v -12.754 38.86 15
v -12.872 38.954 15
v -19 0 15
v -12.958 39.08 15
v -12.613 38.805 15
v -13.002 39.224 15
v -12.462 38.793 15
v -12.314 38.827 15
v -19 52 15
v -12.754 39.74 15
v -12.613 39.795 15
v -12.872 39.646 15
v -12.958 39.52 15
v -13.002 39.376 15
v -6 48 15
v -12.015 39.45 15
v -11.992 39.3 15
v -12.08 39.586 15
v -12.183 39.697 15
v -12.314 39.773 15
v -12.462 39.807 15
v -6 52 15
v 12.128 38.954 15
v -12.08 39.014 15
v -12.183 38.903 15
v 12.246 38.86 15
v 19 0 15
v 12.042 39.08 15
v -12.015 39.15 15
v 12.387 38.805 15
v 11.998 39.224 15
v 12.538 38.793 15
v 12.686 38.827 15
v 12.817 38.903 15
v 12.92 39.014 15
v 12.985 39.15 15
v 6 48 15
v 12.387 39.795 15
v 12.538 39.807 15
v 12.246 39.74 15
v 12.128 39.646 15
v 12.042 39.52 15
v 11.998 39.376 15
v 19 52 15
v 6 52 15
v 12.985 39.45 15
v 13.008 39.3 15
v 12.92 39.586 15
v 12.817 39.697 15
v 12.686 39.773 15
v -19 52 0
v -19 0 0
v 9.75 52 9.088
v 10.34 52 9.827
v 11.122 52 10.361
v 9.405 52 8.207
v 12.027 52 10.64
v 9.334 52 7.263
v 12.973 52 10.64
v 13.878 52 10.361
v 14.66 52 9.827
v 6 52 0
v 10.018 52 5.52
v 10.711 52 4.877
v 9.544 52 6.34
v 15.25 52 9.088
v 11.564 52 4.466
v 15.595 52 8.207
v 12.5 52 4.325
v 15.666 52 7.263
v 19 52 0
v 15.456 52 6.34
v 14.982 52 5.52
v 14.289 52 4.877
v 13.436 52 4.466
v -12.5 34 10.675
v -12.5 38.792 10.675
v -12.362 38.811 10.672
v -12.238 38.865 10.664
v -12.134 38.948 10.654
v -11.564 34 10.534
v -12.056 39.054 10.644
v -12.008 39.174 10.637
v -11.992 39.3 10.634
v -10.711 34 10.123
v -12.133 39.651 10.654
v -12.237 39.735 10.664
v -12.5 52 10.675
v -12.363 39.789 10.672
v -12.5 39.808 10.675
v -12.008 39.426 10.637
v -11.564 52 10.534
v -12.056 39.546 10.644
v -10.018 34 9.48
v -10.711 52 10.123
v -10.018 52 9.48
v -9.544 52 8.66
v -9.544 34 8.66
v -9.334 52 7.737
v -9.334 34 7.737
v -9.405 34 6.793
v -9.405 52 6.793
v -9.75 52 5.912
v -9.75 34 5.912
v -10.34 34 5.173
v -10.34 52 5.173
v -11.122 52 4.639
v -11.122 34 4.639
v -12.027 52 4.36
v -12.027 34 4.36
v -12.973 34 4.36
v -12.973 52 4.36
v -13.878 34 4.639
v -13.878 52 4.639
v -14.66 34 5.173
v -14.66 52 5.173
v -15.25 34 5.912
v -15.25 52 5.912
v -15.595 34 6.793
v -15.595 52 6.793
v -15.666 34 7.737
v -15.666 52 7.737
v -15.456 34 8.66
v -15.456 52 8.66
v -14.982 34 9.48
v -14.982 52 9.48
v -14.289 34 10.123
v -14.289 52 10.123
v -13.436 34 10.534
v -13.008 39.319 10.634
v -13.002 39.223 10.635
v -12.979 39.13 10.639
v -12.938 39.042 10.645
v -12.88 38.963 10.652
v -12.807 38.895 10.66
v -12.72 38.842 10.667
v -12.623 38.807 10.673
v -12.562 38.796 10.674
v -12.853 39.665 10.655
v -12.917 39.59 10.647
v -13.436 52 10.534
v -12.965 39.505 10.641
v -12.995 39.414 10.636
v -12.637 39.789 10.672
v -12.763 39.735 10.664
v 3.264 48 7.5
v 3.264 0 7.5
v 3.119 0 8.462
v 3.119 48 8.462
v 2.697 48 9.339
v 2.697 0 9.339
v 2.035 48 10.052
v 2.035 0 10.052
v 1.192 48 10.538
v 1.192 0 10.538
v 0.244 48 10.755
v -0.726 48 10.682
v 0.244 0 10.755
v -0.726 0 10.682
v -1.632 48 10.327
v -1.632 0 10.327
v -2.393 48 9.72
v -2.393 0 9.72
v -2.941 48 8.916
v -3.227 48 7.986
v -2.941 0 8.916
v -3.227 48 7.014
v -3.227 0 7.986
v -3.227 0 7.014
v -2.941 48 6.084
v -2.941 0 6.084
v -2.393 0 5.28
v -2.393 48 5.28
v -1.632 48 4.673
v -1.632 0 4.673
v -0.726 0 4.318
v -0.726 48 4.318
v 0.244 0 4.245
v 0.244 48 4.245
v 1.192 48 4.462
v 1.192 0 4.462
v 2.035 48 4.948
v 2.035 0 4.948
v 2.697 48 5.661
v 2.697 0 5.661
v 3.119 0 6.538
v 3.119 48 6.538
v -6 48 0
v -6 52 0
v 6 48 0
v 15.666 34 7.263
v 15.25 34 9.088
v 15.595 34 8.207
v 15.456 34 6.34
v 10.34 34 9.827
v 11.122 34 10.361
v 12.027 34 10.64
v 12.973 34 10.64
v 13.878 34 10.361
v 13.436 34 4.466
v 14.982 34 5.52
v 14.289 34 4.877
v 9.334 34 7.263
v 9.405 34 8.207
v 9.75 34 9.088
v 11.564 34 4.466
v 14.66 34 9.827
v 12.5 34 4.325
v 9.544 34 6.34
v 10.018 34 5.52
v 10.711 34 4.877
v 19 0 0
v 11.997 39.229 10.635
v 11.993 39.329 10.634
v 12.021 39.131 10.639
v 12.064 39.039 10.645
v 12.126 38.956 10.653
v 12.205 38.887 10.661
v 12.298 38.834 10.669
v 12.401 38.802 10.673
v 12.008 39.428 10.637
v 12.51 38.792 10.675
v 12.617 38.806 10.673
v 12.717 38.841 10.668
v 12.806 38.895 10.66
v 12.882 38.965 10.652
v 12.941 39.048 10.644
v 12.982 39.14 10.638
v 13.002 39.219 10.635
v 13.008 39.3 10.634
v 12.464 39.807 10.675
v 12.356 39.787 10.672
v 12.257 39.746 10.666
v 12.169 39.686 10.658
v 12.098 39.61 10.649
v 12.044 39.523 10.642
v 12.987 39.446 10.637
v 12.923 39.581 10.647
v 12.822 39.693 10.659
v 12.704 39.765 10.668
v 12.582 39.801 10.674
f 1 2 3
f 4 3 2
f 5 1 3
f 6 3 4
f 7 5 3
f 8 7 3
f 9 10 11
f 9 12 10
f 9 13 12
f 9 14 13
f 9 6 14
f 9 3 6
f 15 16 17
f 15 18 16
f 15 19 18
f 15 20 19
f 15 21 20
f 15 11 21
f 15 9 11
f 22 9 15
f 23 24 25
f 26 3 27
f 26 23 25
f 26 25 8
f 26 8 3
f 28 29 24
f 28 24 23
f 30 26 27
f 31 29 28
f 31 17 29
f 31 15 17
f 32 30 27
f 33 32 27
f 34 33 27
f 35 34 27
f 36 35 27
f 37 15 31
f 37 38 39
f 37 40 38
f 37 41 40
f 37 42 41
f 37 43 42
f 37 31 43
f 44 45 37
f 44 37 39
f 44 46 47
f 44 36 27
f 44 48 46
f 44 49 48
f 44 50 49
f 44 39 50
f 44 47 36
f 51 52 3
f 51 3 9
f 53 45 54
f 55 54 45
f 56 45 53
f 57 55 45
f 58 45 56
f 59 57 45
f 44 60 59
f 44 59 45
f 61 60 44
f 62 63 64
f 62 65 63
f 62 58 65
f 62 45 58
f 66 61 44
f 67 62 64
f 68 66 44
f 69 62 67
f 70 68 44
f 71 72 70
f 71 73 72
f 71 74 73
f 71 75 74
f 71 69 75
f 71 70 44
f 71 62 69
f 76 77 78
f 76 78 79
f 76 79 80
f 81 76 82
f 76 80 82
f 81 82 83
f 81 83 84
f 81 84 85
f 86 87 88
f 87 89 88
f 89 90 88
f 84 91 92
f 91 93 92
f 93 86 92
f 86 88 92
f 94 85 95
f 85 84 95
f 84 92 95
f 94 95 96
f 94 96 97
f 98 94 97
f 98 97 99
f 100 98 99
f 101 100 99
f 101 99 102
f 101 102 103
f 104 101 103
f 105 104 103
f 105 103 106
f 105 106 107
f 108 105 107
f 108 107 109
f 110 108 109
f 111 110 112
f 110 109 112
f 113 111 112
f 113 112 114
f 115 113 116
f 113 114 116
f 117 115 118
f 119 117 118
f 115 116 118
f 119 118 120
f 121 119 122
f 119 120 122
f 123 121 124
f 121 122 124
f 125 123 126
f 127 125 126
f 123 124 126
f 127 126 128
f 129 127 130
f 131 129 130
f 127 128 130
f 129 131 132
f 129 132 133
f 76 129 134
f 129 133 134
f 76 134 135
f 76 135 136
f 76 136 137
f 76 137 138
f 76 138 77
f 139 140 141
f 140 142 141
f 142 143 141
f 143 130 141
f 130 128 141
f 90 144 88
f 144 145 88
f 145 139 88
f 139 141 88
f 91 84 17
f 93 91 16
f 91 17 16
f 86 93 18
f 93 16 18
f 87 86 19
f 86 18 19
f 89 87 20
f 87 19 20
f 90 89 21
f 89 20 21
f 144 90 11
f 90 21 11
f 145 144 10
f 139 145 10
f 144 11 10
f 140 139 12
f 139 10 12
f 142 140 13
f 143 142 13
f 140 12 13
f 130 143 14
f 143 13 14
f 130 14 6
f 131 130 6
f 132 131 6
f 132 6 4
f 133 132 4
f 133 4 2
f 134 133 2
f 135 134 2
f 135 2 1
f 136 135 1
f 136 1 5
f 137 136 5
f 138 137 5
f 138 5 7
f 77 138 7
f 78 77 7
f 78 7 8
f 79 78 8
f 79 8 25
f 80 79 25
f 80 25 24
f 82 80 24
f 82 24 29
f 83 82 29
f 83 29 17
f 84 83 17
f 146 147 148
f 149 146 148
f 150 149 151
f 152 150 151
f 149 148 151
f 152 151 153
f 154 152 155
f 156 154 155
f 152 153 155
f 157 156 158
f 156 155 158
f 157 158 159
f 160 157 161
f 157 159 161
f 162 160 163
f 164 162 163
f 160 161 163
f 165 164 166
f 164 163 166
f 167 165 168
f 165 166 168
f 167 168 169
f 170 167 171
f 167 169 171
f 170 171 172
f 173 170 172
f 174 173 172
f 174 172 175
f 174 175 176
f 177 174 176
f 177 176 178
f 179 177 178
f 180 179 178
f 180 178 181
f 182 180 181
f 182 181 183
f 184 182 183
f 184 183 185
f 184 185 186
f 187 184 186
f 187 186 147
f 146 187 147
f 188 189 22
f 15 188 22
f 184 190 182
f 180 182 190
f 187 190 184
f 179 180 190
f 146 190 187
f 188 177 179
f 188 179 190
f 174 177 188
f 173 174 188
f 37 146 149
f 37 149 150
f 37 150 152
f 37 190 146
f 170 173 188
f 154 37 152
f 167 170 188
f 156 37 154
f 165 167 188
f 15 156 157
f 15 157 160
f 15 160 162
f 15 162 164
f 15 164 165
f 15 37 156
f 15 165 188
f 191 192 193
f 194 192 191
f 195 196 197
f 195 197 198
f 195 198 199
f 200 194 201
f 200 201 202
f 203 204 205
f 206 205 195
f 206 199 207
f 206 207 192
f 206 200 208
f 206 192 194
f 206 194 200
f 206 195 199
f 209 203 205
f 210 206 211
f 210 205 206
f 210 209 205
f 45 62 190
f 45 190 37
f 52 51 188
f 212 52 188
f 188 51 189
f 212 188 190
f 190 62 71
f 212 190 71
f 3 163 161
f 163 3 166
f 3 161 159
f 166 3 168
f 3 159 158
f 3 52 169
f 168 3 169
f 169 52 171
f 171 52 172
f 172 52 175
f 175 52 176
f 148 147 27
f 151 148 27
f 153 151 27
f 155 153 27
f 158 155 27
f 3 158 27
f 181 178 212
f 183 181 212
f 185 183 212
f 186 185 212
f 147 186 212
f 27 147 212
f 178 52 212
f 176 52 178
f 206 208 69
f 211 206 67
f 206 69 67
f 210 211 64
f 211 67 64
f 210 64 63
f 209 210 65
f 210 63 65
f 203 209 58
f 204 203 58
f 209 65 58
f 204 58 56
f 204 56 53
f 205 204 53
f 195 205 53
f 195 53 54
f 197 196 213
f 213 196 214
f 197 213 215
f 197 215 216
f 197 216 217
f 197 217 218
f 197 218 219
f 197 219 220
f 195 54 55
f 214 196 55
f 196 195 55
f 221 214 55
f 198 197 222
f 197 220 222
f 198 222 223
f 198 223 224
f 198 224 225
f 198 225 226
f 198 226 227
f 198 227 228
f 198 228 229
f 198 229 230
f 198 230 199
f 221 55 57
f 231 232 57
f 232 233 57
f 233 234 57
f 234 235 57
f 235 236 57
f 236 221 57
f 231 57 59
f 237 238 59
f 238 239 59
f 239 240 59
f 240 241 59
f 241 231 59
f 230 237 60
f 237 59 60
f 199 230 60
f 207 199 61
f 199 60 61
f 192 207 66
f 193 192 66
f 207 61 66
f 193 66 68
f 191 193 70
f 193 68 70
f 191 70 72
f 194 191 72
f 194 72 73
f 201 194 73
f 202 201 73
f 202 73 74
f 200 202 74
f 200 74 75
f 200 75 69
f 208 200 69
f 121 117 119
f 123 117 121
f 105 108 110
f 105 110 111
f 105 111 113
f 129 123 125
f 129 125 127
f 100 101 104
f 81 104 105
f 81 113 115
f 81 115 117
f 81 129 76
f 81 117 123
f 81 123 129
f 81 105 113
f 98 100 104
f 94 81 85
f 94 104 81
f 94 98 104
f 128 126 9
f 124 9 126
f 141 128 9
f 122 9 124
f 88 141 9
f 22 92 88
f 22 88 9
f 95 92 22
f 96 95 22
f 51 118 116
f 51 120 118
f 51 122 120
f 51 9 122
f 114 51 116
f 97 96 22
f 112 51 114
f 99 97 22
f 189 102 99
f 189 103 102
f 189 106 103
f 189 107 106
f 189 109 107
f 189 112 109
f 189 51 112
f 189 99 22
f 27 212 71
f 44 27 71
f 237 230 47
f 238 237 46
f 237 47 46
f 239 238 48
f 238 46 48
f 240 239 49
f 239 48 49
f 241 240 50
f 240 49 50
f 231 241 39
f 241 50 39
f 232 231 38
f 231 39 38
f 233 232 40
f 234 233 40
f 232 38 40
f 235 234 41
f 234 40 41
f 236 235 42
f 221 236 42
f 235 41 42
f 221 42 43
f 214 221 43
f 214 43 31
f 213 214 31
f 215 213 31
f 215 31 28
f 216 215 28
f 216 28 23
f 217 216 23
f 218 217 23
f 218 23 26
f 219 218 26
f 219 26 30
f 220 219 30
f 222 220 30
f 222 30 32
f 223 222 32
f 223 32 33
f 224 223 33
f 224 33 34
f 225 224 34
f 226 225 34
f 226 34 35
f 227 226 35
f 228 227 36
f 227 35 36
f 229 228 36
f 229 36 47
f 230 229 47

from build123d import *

# Parameters (mm, degrees)
SKETCH1_W               = 38
SKETCH1_H               = 52
EXTRUDE1_DEPTH          = 15
SKETCH3_R               = 3.175
CUT_EXTRUDE2_DEPTH      = 18
SKETCH5_W               = 12
SKETCH5_H               = 15
CUT_EXTRUDE4_DEPTH      = 4
F_1_4_CLEARANCE_HOLE1_D = 6.5278
CUT_EXTRUDE5_REACH      = 17
SKETCH12_R              = 0.508


with BuildPart() as part:
    # Sketch1 → Extrude1 (new body)
    with BuildSketch(Plane.XY):
        with Locations((0, 26)):
            Rectangle(SKETCH1_W, SKETCH1_H)
    extrude(amount=EXTRUDE1_DEPTH)

    # Sketch3 → Cut-Extrude2 (cut)
    with BuildSketch(Plane(origin=(0, 52, 0), x_dir=(-1, 0, 0), z_dir=(0, 1, 0))):
        with Locations(Location((12.5, 7.5, 0), (0, 0, 90))):  # turned: the seam where the file's is
            Circle(SKETCH3_R)
        with Locations(Location((-12.5, 7.5, 0), (0, 0, 270))):  # turned: the seam where the file's is
            Circle(SKETCH3_R)
    extrude(amount=-CUT_EXTRUDE2_DEPTH, mode=Mode.SUBTRACT)

    # Sketch5 → Cut-Extrude4 (cut)
    with BuildSketch(Plane(origin=(0, 52, 0), x_dir=(-1, 0, 0), z_dir=(0, 1, 0))):
        with Locations((0, 7.5)):
            Rectangle(SKETCH5_W, SKETCH5_H)
    extrude(amount=-CUT_EXTRUDE4_DEPTH, mode=Mode.SUBTRACT)

    # 1/4 Clearance Hole1 (through all)
    with Locations(Plane(origin=(0, 48, 0), x_dir=(-1, 0, 0), z_dir=(0, 1, 0))):
        with Locations((0, 7.5)):
            Hole(F_1_4_CLEARANCE_HOLE1_D / 2)

    # Sketch12 → Cut-Extrude5 (cut, up to next)
    with BuildSketch(Plane.XY.offset(15), mode=Mode.PRIVATE) as cut_extrude5_sk1:
        with Locations((-12.5, 39.3)):
            Circle(SKETCH12_R)
    cut_extrude5_tool1 = extrude(cut_extrude5_sk1.sketch, amount=-CUT_EXTRUDE5_REACH, mode=Mode.PRIVATE) & part.part
    add(cut_extrude5_tool1.solids().sort_by_distance((-12.5, 39.3, 15))[0], mode=Mode.SUBTRACT)
    # Sketch12 → Cut-Extrude5 (cut, up to next)
    with BuildSketch(Plane.XY.offset(15), mode=Mode.PRIVATE) as cut_extrude5_sk2:
        with Locations((12.5, 39.3)):
            Circle(SKETCH12_R)
    cut_extrude5_tool2 = extrude(cut_extrude5_sk2.sketch, amount=-CUT_EXTRUDE5_REACH, mode=Mode.PRIVATE) & part.part
    add(cut_extrude5_tool2.solids().sort_by_distance((12.5, 39.3, 15))[0], mode=Mode.SUBTRACT)


solid = part.part
